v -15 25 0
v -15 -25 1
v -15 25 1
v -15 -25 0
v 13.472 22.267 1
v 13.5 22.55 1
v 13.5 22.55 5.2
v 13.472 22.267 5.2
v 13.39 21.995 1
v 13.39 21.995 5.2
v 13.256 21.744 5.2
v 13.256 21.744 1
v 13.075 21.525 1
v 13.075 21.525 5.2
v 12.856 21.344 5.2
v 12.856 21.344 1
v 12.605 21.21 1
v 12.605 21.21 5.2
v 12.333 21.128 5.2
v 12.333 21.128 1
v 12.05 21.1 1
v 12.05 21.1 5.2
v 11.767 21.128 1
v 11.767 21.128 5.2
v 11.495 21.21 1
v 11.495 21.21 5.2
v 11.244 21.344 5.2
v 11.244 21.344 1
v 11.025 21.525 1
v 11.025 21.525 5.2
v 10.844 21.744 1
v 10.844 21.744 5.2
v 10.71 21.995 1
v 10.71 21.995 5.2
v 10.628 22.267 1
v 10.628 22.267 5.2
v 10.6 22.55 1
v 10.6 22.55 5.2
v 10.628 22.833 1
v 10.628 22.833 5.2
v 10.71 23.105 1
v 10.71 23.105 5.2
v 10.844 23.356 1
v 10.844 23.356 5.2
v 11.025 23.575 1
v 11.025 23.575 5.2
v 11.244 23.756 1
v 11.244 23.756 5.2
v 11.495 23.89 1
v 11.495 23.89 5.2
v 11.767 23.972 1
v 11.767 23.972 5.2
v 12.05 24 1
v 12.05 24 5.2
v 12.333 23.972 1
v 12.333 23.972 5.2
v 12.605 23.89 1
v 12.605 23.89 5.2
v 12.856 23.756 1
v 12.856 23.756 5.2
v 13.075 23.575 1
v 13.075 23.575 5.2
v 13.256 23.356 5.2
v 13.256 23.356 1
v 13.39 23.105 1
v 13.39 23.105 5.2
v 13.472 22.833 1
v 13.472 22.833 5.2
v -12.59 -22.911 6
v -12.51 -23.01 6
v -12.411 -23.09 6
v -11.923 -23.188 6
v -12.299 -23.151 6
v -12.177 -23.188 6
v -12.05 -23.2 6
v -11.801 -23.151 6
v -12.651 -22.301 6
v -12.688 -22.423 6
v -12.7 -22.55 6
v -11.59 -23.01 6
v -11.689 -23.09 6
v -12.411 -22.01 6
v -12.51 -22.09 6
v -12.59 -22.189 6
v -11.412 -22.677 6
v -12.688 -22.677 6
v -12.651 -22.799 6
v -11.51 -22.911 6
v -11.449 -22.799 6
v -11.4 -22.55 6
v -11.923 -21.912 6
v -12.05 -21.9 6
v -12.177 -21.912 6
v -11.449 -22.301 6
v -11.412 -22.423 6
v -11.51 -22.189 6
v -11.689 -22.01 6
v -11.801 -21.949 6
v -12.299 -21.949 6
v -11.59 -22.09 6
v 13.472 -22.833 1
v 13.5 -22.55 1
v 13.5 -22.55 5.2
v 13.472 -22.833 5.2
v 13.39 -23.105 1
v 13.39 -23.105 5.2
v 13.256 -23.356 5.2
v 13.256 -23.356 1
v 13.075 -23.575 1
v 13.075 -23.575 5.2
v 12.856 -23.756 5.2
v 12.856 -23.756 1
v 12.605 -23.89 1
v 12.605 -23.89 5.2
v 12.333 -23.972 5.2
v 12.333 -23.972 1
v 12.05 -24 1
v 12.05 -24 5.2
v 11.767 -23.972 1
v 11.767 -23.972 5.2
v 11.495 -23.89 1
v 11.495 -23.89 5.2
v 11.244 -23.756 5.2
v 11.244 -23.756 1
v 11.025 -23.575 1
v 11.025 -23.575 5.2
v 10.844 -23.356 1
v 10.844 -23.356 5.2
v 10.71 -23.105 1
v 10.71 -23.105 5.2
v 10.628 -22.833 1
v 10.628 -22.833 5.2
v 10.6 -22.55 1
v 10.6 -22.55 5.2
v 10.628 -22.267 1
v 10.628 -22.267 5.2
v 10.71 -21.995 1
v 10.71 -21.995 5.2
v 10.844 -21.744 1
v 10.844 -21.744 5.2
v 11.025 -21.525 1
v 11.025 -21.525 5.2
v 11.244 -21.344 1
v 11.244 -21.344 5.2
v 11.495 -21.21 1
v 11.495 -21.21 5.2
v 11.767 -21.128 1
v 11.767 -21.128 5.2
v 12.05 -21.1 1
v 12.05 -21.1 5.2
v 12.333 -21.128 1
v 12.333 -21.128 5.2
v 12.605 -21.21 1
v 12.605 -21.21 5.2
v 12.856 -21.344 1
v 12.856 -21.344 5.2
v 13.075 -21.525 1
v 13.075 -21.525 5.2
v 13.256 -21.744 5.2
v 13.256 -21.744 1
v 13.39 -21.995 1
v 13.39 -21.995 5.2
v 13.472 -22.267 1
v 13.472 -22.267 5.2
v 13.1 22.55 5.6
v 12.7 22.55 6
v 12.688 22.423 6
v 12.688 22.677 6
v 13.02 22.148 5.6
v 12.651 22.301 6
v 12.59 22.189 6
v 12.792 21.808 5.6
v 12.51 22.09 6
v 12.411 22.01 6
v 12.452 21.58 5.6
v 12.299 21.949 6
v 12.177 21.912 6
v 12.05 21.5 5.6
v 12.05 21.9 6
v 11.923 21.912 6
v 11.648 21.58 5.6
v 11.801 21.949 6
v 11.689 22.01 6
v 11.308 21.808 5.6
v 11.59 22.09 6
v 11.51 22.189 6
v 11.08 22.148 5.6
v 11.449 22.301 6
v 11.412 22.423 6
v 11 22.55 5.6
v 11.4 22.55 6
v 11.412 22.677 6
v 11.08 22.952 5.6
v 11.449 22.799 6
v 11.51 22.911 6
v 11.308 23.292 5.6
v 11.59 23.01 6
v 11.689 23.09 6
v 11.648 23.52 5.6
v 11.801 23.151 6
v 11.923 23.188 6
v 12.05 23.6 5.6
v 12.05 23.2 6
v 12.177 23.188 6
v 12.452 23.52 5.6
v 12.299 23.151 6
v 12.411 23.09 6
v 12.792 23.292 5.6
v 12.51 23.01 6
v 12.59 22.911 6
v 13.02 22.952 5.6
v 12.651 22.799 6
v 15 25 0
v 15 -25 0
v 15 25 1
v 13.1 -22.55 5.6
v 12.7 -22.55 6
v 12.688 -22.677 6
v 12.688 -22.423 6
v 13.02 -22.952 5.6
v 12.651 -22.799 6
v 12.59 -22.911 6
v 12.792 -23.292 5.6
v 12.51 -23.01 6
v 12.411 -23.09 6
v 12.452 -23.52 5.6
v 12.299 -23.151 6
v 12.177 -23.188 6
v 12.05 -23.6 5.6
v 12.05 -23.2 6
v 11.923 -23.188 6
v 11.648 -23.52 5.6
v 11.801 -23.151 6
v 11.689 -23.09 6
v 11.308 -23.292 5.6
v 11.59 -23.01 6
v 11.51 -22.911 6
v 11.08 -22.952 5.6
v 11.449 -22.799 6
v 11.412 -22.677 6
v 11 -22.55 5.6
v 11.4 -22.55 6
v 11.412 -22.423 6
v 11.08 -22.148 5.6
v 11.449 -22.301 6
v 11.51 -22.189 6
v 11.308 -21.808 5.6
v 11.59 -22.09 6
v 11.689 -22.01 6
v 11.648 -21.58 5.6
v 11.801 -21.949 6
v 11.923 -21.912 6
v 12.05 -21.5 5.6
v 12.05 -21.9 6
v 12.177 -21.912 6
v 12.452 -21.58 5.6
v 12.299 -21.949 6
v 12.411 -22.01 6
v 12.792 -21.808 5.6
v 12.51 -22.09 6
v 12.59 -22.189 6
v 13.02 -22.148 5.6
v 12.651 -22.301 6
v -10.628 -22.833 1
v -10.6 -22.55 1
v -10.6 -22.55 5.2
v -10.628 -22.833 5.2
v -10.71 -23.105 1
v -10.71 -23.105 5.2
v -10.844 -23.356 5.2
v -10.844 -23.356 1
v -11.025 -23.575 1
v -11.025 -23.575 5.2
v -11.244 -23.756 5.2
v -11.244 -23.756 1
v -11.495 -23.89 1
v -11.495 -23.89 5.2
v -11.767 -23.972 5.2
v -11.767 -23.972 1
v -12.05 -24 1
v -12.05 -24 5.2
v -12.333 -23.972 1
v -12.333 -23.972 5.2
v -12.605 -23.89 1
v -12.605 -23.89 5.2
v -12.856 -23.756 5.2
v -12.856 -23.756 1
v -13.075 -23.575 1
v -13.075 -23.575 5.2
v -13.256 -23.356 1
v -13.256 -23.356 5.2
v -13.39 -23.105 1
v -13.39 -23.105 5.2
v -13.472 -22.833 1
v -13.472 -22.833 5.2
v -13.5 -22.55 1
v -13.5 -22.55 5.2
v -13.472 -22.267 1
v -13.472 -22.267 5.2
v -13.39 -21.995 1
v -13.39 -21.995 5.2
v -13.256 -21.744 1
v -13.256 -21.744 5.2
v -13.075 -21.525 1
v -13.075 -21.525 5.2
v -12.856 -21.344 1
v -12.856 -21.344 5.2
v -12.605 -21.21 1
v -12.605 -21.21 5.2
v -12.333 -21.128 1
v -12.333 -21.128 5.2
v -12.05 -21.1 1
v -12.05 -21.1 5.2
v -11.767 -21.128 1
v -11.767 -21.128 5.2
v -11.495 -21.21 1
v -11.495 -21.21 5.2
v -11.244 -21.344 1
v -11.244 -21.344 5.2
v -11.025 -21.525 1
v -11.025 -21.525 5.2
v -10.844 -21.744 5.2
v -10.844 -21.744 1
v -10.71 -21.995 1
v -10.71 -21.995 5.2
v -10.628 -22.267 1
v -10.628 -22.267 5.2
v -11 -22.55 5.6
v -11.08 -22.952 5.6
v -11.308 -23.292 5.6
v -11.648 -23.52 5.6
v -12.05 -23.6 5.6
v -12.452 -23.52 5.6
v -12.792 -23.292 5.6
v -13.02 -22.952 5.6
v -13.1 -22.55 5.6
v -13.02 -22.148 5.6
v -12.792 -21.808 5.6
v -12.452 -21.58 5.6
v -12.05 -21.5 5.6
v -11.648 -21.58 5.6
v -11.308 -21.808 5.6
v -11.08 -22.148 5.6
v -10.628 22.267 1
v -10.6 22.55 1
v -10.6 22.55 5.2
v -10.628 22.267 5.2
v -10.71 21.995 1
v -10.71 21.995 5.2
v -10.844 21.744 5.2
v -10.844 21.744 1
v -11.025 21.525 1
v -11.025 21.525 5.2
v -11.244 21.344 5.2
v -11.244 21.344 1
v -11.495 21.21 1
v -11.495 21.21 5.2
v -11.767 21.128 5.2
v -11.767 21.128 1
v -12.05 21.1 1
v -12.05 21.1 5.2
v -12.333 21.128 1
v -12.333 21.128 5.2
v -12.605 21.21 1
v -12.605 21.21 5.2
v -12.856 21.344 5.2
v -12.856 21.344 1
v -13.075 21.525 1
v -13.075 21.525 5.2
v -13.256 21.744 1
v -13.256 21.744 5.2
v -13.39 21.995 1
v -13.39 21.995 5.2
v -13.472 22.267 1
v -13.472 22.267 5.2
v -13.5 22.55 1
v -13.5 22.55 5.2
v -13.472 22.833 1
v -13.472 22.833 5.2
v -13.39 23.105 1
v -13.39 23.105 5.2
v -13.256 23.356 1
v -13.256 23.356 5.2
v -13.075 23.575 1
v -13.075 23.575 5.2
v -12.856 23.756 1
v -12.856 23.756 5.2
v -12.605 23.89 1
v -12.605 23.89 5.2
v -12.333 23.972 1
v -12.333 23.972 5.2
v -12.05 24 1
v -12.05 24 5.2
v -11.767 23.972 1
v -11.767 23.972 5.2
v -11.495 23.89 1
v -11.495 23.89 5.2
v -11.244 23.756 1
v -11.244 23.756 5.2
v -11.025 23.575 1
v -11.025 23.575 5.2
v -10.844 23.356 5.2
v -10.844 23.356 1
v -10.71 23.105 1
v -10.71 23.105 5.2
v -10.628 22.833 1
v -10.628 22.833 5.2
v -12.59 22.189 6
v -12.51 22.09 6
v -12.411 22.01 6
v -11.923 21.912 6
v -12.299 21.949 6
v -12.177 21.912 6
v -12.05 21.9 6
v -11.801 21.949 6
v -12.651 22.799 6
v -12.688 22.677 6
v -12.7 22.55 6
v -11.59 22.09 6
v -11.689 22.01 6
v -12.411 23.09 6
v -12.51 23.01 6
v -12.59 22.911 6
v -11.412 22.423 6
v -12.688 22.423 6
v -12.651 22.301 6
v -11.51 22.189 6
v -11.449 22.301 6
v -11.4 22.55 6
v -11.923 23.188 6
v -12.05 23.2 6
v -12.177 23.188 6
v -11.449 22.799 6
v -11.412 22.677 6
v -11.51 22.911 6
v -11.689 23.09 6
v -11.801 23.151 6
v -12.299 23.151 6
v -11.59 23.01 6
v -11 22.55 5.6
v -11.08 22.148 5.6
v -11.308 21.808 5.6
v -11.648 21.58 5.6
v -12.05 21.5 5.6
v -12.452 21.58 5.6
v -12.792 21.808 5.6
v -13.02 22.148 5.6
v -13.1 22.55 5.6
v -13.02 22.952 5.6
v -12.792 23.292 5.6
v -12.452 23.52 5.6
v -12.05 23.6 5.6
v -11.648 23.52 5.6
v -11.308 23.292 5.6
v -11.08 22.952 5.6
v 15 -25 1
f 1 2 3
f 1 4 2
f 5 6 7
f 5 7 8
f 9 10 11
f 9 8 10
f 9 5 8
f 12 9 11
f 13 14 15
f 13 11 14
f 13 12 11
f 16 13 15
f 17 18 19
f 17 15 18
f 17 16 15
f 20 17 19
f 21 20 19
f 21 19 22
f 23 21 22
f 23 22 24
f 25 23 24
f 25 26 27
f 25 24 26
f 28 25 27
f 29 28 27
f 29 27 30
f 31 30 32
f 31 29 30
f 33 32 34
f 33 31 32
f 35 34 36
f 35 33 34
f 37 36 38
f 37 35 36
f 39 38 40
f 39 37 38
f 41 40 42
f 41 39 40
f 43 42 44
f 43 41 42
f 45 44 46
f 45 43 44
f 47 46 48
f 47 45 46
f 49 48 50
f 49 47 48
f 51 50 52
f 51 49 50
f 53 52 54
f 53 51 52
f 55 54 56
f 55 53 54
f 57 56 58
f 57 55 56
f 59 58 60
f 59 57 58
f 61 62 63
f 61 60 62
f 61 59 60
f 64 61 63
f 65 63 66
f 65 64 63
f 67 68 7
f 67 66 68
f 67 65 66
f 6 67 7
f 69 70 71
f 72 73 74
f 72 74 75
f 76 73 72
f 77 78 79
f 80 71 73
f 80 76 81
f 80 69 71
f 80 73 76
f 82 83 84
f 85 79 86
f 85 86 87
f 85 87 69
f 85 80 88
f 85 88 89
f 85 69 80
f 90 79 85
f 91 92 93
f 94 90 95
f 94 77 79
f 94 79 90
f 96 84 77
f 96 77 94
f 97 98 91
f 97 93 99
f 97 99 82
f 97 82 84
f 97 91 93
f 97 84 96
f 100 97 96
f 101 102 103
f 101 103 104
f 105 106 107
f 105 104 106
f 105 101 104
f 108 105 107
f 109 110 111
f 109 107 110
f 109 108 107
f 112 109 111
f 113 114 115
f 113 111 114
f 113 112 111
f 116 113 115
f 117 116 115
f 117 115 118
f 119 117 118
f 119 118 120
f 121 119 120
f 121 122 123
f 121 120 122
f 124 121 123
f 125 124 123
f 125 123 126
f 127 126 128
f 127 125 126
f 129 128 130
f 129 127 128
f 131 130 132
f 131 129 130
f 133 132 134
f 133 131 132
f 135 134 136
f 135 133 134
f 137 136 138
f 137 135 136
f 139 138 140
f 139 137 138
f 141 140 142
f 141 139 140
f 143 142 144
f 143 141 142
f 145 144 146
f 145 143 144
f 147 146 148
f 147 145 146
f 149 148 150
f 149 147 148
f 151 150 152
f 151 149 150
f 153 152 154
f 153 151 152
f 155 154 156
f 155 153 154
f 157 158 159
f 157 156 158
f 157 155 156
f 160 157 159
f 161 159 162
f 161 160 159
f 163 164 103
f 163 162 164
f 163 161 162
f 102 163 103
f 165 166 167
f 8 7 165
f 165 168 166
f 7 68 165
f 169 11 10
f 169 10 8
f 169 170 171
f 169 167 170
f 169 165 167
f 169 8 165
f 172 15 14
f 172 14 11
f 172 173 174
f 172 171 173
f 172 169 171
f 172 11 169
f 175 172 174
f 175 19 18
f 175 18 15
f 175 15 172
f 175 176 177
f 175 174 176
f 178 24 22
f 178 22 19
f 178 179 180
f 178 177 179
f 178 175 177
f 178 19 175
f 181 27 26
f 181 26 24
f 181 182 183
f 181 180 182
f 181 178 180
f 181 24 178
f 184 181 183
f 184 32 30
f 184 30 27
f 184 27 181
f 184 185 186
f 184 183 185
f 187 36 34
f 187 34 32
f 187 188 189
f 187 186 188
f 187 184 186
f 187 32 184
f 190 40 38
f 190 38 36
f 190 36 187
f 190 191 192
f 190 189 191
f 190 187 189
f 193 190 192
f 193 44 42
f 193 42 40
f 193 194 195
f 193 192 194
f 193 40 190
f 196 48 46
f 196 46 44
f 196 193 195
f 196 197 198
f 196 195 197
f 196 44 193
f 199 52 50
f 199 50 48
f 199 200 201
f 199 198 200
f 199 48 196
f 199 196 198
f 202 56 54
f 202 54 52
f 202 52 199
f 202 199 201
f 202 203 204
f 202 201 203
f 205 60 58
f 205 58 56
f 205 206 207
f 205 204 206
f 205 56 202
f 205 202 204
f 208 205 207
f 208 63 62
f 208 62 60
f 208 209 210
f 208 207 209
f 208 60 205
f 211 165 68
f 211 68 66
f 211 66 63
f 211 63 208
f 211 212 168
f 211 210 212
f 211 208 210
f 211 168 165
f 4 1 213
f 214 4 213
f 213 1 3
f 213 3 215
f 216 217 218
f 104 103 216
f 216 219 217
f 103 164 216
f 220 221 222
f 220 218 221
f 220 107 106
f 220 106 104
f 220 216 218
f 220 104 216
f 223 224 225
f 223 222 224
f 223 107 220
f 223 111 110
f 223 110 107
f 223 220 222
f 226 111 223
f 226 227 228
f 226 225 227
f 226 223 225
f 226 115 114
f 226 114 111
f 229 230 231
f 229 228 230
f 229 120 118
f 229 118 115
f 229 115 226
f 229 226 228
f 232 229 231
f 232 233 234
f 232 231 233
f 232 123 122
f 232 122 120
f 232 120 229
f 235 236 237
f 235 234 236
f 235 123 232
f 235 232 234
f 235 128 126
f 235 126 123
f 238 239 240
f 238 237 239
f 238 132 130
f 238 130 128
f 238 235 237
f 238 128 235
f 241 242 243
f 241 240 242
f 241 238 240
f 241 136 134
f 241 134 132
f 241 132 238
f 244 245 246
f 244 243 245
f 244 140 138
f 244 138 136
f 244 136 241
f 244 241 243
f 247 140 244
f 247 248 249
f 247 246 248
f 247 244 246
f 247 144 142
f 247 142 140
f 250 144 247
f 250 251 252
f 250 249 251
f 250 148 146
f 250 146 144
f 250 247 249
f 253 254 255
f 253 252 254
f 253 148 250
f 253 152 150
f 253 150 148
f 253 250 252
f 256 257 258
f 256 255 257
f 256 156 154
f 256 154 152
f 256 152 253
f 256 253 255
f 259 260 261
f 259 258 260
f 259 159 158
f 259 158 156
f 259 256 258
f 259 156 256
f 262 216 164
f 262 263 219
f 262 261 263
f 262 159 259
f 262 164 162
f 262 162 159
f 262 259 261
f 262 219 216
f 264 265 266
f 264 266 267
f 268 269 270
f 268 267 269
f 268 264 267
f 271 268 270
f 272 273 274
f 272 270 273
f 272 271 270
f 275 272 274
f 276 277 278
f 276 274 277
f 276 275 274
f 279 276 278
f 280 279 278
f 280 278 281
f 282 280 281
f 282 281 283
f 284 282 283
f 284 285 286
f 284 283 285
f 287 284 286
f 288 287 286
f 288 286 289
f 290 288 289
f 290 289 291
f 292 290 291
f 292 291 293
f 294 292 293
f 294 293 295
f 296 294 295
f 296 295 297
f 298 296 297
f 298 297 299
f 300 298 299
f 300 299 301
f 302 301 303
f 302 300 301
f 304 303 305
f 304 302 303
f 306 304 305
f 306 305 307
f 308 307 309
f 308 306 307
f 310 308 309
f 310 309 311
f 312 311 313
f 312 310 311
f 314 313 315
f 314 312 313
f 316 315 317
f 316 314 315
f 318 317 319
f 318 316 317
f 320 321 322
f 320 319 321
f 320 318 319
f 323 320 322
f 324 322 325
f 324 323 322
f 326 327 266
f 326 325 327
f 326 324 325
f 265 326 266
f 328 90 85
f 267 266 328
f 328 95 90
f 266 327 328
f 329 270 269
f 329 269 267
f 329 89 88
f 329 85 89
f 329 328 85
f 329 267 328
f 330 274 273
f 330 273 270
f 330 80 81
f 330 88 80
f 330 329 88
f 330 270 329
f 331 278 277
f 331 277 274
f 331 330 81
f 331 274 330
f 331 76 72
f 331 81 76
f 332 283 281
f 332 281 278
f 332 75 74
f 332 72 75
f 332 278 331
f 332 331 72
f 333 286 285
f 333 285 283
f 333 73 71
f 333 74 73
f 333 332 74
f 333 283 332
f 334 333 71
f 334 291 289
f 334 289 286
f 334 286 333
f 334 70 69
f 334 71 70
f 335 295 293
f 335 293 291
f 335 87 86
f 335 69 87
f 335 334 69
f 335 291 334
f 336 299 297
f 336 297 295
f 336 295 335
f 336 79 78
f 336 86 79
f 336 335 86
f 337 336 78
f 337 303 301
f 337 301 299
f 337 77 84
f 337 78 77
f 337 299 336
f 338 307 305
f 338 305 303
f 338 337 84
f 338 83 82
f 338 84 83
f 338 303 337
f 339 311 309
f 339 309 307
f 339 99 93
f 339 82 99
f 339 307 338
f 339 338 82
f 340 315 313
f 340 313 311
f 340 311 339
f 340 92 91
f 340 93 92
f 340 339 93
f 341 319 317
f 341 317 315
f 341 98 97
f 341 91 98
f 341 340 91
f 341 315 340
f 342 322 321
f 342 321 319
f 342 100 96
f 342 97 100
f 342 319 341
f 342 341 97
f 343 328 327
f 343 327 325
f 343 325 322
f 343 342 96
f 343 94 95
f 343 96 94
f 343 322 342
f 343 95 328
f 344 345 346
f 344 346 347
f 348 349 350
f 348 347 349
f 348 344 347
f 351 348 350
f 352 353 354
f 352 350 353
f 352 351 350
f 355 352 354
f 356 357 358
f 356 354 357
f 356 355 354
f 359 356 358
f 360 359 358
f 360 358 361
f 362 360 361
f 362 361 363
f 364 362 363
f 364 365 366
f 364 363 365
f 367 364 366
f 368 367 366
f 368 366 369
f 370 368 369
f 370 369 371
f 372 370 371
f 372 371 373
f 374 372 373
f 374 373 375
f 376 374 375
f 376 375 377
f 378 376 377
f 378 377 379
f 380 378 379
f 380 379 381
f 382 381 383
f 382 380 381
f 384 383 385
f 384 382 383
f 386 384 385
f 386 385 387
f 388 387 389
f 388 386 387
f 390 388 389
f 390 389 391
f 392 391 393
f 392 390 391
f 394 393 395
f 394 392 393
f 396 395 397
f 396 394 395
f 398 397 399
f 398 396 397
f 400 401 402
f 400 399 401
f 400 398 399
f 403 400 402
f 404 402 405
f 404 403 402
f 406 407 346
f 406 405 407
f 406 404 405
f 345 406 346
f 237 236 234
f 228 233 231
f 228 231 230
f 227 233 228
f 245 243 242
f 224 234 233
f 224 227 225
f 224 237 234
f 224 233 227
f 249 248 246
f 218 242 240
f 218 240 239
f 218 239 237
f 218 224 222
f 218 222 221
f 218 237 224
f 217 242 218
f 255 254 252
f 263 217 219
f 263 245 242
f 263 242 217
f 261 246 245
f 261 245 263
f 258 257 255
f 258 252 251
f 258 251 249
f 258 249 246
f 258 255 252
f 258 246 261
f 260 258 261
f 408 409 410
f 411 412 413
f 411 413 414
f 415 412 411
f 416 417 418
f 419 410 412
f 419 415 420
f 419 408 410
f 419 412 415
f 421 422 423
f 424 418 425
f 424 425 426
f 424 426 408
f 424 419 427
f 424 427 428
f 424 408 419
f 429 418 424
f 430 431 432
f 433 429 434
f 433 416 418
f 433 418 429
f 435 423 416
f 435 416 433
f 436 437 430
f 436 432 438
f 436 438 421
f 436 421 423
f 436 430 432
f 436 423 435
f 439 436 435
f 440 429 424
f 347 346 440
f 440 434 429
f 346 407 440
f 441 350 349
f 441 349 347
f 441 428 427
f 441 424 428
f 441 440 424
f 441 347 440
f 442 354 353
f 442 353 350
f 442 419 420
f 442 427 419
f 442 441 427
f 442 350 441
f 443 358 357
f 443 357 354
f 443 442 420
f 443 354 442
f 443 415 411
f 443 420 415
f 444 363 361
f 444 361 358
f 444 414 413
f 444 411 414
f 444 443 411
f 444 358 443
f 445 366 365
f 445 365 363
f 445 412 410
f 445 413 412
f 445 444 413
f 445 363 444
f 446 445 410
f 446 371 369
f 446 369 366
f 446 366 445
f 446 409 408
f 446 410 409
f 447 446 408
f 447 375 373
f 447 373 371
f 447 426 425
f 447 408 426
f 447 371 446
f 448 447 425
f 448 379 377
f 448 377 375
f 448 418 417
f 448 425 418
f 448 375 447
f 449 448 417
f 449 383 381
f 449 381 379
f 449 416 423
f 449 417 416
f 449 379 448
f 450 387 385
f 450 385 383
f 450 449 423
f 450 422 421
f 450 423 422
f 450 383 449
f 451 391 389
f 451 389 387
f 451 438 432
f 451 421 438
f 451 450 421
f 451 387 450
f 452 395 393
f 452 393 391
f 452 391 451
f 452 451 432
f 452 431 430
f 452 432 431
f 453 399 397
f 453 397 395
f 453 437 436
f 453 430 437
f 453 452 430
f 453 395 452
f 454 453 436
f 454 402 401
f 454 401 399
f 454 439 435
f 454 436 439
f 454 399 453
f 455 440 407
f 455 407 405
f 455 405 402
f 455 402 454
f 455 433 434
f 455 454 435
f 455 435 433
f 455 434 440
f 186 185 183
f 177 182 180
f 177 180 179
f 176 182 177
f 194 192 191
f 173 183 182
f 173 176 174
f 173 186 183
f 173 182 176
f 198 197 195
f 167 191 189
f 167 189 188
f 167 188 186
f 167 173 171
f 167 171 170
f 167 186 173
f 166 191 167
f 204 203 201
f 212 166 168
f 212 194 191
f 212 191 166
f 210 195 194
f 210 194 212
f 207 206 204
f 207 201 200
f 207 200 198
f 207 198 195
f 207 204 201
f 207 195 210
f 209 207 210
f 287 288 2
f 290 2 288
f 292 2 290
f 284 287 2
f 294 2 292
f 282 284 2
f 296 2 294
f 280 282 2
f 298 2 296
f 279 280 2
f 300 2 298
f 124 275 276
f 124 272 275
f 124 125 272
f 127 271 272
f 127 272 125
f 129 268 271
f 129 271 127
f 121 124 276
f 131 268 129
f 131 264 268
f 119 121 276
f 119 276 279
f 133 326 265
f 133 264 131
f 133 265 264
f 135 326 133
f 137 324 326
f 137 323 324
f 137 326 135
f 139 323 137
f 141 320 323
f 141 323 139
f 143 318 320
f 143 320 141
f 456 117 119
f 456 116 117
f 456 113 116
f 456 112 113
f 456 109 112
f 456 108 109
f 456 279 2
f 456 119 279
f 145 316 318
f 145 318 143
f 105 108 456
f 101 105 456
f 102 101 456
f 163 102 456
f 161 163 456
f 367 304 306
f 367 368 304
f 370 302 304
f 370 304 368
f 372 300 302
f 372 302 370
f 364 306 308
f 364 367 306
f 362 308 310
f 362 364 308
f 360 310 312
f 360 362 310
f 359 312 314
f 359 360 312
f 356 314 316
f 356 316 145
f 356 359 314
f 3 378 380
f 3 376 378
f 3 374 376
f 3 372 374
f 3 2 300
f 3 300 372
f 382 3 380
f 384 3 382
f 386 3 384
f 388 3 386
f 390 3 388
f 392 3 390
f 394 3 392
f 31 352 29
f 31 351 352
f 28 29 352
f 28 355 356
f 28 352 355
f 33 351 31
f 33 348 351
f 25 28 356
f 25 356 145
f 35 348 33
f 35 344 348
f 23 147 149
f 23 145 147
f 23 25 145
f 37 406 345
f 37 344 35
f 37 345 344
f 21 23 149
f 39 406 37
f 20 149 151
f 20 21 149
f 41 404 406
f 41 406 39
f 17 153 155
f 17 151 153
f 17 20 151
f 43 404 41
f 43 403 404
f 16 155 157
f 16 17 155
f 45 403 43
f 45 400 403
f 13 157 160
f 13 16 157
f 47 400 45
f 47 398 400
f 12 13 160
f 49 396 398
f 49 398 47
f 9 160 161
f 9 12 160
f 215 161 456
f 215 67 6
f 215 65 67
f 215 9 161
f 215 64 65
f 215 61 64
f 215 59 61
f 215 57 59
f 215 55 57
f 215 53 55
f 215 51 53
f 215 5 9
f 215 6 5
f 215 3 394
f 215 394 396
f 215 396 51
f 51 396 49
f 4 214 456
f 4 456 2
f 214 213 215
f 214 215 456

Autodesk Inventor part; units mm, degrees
ref_plane "YZ Plane" through (0, 0, 0) normal (1, 0, 0) x (0, 1, 0)
ref_plane "XZ Plane" through (0, 0, 0) normal (0, 1, 0) x (-1, 0, 0)
ref_plane "XY Plane" through (0, 0, 0) normal (0, 0, 1) x (1, 0, 0)
sketch "Sketch1" plane through (0, 0, 0) normal (0, 0, 1) x (1, 0, 0)
  circle A0 centre (12.05, 22.55) radius 1.45 projected
  circle A1 centre (-12.05, 22.55) radius 1.45 projected
  circle A2 centre (-12.05, -22.55) radius 1.45 projected
  circle A3 centre (12.05, -22.55) radius 1.45 projected
  line L0 (15, -25) -> (-15, -25) projected
  line L1 (15, 25) -> (15, -25) projected
  line L2 (-15, 25) -> (15, 25) projected
  line L3 (-15, -25) -> (-15, 25) projected
  point P0 (0, 0)
extrude "Extrusion1" add sketch "Sketch1" along normal blind 1
sketch "Sketch2" plane through (0, 0, 1) normal (0, 0, 1) x (1, 0, 0)
  line L0 (15, 25) -> (-15, 25) projected
  line L1 (-15, 25) -> (-15, -25) projected
  line L2 (-15, -25) -> (15, -25) projected
  line L3 (15, -25) -> (15, 25) projected
  circle A0 centre (12.05, -22.55) radius 1.45 projected
  circle A1 centre (-12.05, -22.55) radius 1.45 projected
  circle A2 centre (-12.05, 22.55) radius 1.45 projected
  circle A3 centre (12.05, 22.55) radius 1.45 projected
  point P0 (0, 0)
extrude "Extrusion2" add sketch "Sketch2" along normal blind 5 and the other way blind 1 contours A0 | A1 | A2 | A3
chamfer "Chamfer1" distance 0.8 angle 45 4 edges at (-13.5, -22.55, 6) (-13.5, 22.55, 6) (10.6, 22.55, 6) (10.6, -22.55, 6)
properties part number "buck_holes_check"
